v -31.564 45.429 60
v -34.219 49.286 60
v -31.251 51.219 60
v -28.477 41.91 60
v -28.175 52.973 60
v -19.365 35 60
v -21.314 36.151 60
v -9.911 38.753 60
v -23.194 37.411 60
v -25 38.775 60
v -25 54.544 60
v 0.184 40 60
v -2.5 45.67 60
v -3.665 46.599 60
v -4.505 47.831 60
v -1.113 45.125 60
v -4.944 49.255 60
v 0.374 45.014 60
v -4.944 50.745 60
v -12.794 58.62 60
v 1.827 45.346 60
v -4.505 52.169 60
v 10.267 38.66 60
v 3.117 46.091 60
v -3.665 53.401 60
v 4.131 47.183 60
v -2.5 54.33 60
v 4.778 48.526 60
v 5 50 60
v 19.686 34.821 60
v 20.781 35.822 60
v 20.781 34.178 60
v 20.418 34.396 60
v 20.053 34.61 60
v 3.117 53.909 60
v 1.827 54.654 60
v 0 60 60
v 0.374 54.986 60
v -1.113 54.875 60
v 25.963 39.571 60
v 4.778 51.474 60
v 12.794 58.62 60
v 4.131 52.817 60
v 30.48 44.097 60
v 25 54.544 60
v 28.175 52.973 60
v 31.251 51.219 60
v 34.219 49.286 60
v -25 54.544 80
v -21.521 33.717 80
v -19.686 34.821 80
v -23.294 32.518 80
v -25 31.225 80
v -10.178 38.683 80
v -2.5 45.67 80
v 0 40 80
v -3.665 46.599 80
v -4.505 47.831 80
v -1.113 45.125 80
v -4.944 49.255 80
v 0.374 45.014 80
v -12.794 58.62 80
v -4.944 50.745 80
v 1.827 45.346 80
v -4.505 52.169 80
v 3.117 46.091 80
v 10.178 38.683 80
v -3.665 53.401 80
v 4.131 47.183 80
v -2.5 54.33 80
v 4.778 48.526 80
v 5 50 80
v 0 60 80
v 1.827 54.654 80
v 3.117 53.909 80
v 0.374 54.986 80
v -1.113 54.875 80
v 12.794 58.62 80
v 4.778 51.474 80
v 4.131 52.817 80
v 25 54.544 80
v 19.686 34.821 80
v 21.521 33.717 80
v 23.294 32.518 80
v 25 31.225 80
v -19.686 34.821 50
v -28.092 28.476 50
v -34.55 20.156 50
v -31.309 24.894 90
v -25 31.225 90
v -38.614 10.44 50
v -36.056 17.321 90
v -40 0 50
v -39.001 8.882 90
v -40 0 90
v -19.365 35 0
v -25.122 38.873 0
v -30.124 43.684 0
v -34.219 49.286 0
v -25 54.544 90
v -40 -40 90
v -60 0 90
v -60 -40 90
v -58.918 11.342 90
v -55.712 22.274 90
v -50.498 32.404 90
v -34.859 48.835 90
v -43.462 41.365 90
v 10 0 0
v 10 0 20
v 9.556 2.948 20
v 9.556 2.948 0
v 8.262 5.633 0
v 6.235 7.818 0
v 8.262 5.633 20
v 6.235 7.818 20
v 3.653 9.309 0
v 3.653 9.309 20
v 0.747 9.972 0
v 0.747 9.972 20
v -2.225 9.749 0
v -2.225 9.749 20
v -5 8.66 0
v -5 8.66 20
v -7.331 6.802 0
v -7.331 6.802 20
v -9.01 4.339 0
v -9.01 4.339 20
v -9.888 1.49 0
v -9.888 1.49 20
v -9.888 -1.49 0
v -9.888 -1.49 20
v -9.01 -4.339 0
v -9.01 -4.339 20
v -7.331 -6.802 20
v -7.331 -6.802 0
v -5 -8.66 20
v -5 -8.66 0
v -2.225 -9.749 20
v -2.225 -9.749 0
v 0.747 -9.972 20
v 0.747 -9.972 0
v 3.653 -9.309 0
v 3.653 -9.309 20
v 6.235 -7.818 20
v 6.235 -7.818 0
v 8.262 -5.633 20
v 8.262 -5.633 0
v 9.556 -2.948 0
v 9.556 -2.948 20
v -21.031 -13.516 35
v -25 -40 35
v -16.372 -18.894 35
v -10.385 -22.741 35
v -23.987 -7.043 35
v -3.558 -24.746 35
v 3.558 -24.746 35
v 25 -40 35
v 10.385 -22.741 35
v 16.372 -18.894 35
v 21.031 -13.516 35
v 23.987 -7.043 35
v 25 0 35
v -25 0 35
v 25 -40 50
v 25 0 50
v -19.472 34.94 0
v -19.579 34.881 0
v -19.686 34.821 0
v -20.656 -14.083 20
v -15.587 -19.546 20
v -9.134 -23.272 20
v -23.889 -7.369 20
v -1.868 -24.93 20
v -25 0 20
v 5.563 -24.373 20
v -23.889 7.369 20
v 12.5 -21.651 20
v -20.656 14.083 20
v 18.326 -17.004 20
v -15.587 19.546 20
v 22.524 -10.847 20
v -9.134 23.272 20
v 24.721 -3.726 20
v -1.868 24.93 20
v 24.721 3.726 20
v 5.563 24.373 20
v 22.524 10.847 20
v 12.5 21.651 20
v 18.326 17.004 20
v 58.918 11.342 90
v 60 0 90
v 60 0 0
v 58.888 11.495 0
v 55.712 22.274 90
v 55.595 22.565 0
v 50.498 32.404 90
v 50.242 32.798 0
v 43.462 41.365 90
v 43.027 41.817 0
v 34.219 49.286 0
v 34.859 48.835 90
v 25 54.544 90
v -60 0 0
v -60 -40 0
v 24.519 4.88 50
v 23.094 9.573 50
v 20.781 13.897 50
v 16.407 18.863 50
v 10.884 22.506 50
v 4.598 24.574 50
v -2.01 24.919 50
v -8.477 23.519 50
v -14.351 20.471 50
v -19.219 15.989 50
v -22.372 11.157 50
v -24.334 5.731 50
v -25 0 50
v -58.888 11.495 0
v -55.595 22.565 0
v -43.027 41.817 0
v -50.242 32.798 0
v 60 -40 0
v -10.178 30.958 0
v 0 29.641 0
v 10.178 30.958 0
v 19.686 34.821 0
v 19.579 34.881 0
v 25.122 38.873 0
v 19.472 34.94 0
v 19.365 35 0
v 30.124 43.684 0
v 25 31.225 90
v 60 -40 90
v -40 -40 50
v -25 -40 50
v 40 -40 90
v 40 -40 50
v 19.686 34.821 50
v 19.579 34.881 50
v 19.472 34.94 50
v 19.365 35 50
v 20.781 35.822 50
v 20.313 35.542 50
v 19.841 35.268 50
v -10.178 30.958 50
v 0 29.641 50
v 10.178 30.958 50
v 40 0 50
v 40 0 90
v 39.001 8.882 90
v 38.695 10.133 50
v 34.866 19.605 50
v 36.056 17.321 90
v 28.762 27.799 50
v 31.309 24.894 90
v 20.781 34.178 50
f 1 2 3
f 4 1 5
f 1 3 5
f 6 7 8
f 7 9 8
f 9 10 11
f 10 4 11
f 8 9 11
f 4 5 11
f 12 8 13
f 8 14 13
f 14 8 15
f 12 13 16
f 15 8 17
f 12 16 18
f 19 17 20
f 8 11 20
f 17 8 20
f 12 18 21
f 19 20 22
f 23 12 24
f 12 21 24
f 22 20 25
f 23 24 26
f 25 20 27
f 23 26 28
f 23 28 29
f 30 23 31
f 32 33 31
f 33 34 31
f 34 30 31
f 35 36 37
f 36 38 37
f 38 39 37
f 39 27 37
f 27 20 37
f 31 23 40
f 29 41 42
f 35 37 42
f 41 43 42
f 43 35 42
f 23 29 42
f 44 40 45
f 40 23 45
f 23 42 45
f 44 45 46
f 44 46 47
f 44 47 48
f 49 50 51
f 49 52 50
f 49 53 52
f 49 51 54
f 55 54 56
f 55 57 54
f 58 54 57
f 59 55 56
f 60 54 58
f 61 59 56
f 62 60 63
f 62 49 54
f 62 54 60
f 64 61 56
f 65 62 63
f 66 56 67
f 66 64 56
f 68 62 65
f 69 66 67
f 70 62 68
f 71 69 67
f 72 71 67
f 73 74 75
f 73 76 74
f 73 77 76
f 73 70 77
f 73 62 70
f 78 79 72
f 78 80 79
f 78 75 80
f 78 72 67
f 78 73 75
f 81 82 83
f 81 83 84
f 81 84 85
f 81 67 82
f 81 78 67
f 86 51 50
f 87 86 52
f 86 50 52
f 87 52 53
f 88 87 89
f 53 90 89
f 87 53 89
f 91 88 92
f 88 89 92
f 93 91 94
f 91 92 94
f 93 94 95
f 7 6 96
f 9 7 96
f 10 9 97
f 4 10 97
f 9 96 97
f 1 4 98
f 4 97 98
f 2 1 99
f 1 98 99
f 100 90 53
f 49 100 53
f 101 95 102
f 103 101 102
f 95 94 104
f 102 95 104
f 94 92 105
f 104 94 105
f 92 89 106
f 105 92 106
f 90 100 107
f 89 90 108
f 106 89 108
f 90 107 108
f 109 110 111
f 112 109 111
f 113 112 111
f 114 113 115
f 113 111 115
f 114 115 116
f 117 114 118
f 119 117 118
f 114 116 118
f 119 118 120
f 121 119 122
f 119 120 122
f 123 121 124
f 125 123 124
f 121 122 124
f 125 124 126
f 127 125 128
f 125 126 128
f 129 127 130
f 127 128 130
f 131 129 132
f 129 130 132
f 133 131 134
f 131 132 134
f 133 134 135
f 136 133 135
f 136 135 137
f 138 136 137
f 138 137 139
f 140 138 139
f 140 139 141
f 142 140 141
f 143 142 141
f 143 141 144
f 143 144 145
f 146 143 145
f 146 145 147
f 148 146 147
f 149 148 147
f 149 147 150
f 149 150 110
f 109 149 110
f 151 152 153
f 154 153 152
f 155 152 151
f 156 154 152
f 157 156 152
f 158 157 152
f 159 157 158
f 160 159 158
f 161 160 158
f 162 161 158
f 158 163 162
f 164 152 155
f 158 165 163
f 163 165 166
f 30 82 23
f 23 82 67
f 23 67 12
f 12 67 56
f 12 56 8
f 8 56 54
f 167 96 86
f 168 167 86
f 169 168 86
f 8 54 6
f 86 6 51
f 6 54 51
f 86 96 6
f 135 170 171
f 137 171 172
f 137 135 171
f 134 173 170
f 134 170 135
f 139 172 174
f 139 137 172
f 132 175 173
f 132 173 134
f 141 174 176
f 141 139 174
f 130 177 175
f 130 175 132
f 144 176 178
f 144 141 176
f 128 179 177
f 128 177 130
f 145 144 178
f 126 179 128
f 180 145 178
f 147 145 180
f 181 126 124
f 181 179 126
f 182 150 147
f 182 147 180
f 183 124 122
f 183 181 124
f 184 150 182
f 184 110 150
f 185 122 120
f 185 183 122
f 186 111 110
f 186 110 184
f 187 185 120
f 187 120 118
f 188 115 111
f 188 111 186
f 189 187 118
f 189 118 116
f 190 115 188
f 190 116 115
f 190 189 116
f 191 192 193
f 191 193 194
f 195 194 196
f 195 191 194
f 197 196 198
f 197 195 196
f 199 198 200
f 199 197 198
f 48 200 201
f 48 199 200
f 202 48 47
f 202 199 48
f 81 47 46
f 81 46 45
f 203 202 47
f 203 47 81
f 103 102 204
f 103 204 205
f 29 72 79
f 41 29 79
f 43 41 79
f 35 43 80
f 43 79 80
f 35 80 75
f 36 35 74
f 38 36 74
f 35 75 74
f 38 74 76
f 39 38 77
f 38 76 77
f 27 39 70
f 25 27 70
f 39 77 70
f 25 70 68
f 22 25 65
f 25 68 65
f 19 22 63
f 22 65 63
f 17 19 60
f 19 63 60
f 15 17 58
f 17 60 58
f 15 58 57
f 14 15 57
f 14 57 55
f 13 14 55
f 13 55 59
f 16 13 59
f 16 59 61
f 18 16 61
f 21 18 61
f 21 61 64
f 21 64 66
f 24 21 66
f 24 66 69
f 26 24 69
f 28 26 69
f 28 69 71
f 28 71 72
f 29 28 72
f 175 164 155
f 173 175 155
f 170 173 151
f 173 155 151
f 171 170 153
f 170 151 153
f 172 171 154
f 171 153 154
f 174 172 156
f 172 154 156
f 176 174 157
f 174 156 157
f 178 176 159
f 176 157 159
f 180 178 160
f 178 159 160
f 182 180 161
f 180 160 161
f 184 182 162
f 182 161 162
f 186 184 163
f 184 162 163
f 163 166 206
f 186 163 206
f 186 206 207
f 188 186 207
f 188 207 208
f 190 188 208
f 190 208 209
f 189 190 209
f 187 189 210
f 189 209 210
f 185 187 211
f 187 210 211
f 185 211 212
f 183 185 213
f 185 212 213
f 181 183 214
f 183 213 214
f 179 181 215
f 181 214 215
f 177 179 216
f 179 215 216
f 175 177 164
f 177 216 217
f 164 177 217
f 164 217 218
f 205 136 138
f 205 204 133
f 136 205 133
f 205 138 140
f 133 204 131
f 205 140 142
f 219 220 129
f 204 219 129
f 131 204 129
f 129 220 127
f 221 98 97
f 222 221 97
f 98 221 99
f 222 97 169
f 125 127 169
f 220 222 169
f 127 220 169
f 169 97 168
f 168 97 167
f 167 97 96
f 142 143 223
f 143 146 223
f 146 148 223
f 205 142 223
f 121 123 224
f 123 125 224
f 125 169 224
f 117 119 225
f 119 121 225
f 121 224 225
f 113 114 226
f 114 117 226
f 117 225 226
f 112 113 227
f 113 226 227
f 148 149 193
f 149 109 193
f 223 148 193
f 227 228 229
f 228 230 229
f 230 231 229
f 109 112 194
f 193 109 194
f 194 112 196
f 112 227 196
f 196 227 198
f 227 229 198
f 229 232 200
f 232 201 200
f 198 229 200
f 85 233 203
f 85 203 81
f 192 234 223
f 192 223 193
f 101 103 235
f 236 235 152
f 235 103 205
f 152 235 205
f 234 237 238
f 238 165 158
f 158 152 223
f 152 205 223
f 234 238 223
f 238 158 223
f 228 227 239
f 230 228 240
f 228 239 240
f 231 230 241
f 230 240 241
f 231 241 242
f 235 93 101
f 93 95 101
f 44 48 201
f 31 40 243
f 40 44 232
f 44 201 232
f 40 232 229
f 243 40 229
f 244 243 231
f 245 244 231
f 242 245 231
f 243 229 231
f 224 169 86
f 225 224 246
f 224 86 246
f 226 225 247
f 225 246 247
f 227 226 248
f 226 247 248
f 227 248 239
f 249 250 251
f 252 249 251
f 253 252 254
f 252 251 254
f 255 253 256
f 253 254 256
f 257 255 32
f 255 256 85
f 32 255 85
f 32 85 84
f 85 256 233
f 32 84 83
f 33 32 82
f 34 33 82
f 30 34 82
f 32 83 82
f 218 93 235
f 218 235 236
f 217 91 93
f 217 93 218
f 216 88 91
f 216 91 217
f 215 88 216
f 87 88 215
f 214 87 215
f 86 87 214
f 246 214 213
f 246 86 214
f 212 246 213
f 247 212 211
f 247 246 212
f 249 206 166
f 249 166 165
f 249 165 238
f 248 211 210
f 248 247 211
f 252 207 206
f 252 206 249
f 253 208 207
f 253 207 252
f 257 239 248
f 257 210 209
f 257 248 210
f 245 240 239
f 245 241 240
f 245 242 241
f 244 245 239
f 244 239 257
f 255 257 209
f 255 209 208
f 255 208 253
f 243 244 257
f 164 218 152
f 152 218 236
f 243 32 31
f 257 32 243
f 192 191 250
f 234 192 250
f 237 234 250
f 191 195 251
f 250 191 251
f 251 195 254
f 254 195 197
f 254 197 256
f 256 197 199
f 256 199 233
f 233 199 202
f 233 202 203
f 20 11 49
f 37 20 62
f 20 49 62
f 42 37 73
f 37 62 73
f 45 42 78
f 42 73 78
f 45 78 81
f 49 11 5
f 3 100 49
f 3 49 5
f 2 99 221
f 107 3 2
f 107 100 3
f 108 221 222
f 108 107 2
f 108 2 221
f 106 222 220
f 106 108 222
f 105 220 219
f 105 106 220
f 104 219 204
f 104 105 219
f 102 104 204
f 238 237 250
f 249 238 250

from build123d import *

# Parameters (mm, degrees)
BOSS_EXTRUDE1_DEPTH      = 90
SKETCH3_R                = 10
CUT_EXTRUDE2_DEPTH       = 90
SKETCH6_R                = 10
BOSS_EXTRUDE2_DEPTH      = 90
SKETCH7_R                = 5
CUT_EXTRUDE3_DEPTH       = 90
CUT_EXTRUDE4_DEPTH       = 60
CUT_EXTRUDE5_DEPTH       = 60
BOSS_EXTRUDE3_DEPTH      = 10
BOSS_EXTRUDE4_DEPTH      = 55
CUT_EXTRUDE6_DEPTH       = 40
CUT_EXTRUDE7_DEPTH       = 106
SKETCH16_R               = 5
CUT_EXTRUDE8_DEPTH       = 106
CUT_EXTRUDE9_DEPTH       = 70
SKETCH18_R               = 5
BOSS_EXTRUDE6_DEPTH      = 15
CUT_EXTRUDE18_DEPTH      = 40
SKETCH22_W               = 40
SKETCH22_H               = 41.844000914
CUT_EXTRUDE19_DEPTH      = 20
SKETCH23_W               = 40
SKETCH23_H               = 40.367693543
CUT_EXTRUDE20_DEPTH      = 20
SKETCH25_R               = 25
BOSS_EXTRUDE7_DEPTH      = 40
SKETCH26_R               = 25
CUT_EXTRUDE21_DEPTH      = 10
CUT_EXTRUDE22_DEPTH      = 34
SKETCH28_R               = 25
CUT_EXTRUDE24_DEPTH      = 60
BOSS_EXTRUDE10_DEPTH     = 15
BOSS_EXTRUDE11_DEPTH     = 30
CUT_EXTRUDE28_DEPTH      = 209.999
BOSS_EXTRUDE12_DEPTH     = 30
SKETCH36_W               = 50
SKETCH36_H               = 10
CUT_EXTRUDE29_DEPTH      = 87
SKETCH38_R               = 5
CUT_EXTRUDE30_DEPTH      = 87
SKETCH39_R               = 10
BOSS_EXTRUDE14_DEPTH     = 60
SKETCH40_R               = 10
CUT_EXTRUDE31_DEPTH      = 40
CUT_EXTRUDE32_DEPTH      = 20
SKETCH47_W               = 40
SKETCH47_H               = 10
CUT_EXTRUDE34_DEPTH      = 65
BOSS_EXTRUDE23_DEPTH     = 20
SKETCH49_R               = 10
CUT_EXTRUDE35_DEPTH      = 20
SKETCH50_R               = 25
CUT_EXTRUDE36_DEPTH      = 60
CUT_EXTRUDE39_DEPTH      = 40
CUT_EXTRUDE41_DEPTH      = 4574
BOSS_EXTRUDE24_DEPTH     = 20
CUT_EXTRUDE43_DEPTH      = 11
CUT_EXTRUDE43_DEPTH_BACK = 81
CUT_EXTRUDE47_DEPTH      = 30
CUT_EXTRUDE48_DEPTH      = 5


with BuildPart() as part:
    # Sketch1 → Boss-Extrude1 (new body)
    with BuildSketch(Plane.XY):
        with BuildLine():
            Line((-40, 0), (-40, -40))
            Line((-40, -40), (40, -40))
            Line((40, -40), (40, 0))
            ThreePointArc((40, 0), (0, 40), (-40, 0))
        make_face()
    extrude(amount=BOSS_EXTRUDE1_DEPTH)

    # Sketch3 → Cut-Extrude2 (cut)
    with BuildSketch(Plane.XY.offset(90)):
        Circle(SKETCH3_R)
    extrude(amount=-CUT_EXTRUDE2_DEPTH, mode=Mode.SUBTRACT)

    # Sketch6 → Boss-Extrude2 (add)
    with BuildSketch(Plane.XY.offset(90)):
        with BuildLine():
            Line((-60, 0), (-60, -40))
            Line((-60, -40), (60, -40))
            Line((60, -40), (60, 0))
            ThreePointArc((60, 0), (0, 60), (-60, 0))
        make_face()
        Circle(SKETCH6_R, mode=Mode.SUBTRACT)
    extrude(amount=-BOSS_EXTRUDE2_DEPTH)

    # Sketch7 → Cut-Extrude3 (cut)
    with BuildSketch(Plane.XY.offset(90)):
        with Locations((0, 50)):
            Circle(SKETCH7_R)
    extrude(amount=-CUT_EXTRUDE3_DEPTH, mode=Mode.SUBTRACT)

    # Sketch8 → Cut-Extrude4 (cut)
    with BuildSketch(Plane(origin=(0, 0, 0), x_dir=(-1, 0, 0), z_dir=(0, 0, -1))):
        with BuildLine():
            ThreePointArc((34.218684477, 49.285714286), (0, 30), (-34.218684477, 49.285714286))
            ThreePointArc((-34.218684477, 49.285714286), (0, 60), (34.218684477, 49.285714286))
        make_face()
    extrude(amount=-CUT_EXTRUDE4_DEPTH, mode=Mode.SUBTRACT)

    # Sketch10 → Cut-Extrude5 (cut)
    with BuildSketch(Plane.XY.offset(50)):
        with BuildLine():
            Line((-25, 54.543560573), (-25, 32))
            ThreePointArc((-25, 32), (0, 40.607881008), (25, 32))
            Line((25, 32), (25, 54.543560573))
            ThreePointArc((25, 54.543560573), (0, 60), (-25, 54.543560573))
        make_face()
    extrude(amount=CUT_EXTRUDE5_DEPTH, mode=Mode.SUBTRACT)

    # Sketch12 → Boss-Extrude3 (add)
    with BuildSketch(Plane.XY.offset(50)):
        with BuildLine():
            ThreePointArc((25, 38.775010008), (22.557314587, 36.967174529), (19.98443144, 35.35))
            Line((19.98443144, 35.35), (25, 32))
            Line((25, 32), (25, 38.775010008))
        make_face()
        with BuildLine():
            ThreePointArc((-19.98443144, 35.35), (-22.557314587, 36.967174529), (-25, 38.775010008))
            Line((-25, 38.775010008), (-25, 32))
            Line((-25, 32), (-19.98443144, 35.35))
        make_face()
    extrude(amount=BOSS_EXTRUDE3_DEPTH)

    # Sketch13 → Boss-Extrude4 (add)
    with BuildSketch(Plane.XY.offset(90)):
        with BuildLine():
            ThreePointArc((-25, 54.543560573), (0, 60), (25, 54.543560573))
            Line((25, 54.543560573), (25, 32))
            ThreePointArc((25, 32), (0, 40.607881008), (-25, 32))
            Line((-25, 32), (-25, 54.543560573))
        make_face()
    extrude(amount=-BOSS_EXTRUDE4_DEPTH)

    # Sketch14 → Cut-Extrude6 (cut)
    with BuildSketch(Plane.XY.offset(90)):
        with BuildLine():
            Line((-25, 54.543560573), (-25, 32))
            ThreePointArc((-25, 32), (0, 40.607881008), (25, 32))
            Line((25, 32), (25, 54.543560573))
            ThreePointArc((25, 54.543560573), (0, 60), (-25, 54.543560573))
        make_face()
    extrude(amount=-CUT_EXTRUDE6_DEPTH, mode=Mode.SUBTRACT)

    # Sketch15 → Cut-Extrude7 (cut)
    with BuildSketch(Plane(origin=(0, 0, 35), x_dir=(-1, 0, 0), z_dir=(0, 0, -1))):
        with BuildLine():
            ThreePointArc((-19.98443144, 35.35), (0, 40.607881008), (19.98443144, 35.35))
            ThreePointArc((19.98443144, 35.35), (0, 30), (-19.98443144, 35.35))
        make_face()
    extrude(amount=-CUT_EXTRUDE7_DEPTH, mode=Mode.SUBTRACT)

    # Sketch16 → Cut-Extrude8 (cut)
    with BuildSketch(Plane.XY.offset(50)):
        with Locations((0, 50)):
            Circle(SKETCH16_R)
    extrude(amount=-CUT_EXTRUDE8_DEPTH, mode=Mode.SUBTRACT)

    # Sketch17 → Cut-Extrude9 (cut)
    with BuildSketch(Plane.XY.offset(90)):
        with BuildLine():
            Line((-25, 0), (-25, -40))
            Line((-25, -40), (25, -40))
            Line((25, -40), (25, 0))
            ThreePointArc((25, 0), (0, 25), (-25, 0))
        make_face()
    extrude(amount=-CUT_EXTRUDE9_DEPTH, mode=Mode.SUBTRACT)

    # Sketch18 → Boss-Extrude6 (add)
    with BuildSketch(Plane.XY.offset(50)):
        with Locations((0, 50)):
            Circle(SKETCH18_R)
    extrude(amount=-BOSS_EXTRUDE6_DEPTH)

    # Sketch19 → Cut-Extrude18 (cut)
    with BuildSketch(Plane.XY.offset(50)):
        with BuildLine():
            Line((-40, 0), (-40, -40))
            Line((-40, -40), (40, -40))
            Line((40, -40), (40, 0))
            ThreePointArc((40, 0), (0, 40), (-40, 0))
        make_face()
    extrude(amount=CUT_EXTRUDE18_DEPTH, mode=Mode.SUBTRACT)

    # Sketch22 → Cut-Extrude19 (cut)
    with BuildSketch(Plane(origin=(-25, 0, 0), x_dir=(0, 0, -1), z_dir=(1, 0, 0))):
        with Locations((-70, 33.621560116)):
            Rectangle(SKETCH22_W, SKETCH22_H)
    extrude(amount=CUT_EXTRUDE19_DEPTH, mode=Mode.SUBTRACT)

    # Sketch23 → Cut-Extrude20 (cut)
    with BuildSketch(Plane.ZY.offset(-25)):
        with Locations((70, 34.359713801)):
            Rectangle(SKETCH23_W, SKETCH23_H)
    extrude(amount=CUT_EXTRUDE20_DEPTH, mode=Mode.SUBTRACT)

    # Sketch27 → Cut-Extrude22 (cut)
    with BuildSketch(Plane(origin=(0, 0, 35), x_dir=(-1, 0, 0), z_dir=(0, 0, -1))):
        with BuildLine():
            Line((-25, 54.543560573), (-25, 38.775010008))
            ThreePointArc((-25, 38.775010008), (-22.557314587, 36.967174529), (-19.98443144, 35.35))
            ThreePointArc((-19.98443144, 35.35), (0, 40.607881008), (19.98443144, 35.35))
            ThreePointArc((19.98443144, 35.35), (22.557314587, 36.967174529), (25, 38.775010008))
            Line((25, 38.775010008), (25, 54.543560573))
            ThreePointArc((25, 54.543560573), (0, 60), (-25, 54.543560573))
        make_face()
    extrude(amount=-CUT_EXTRUDE22_DEPTH, mode=Mode.SUBTRACT)

    # Sketch32 → Boss-Extrude10 (add)
    with BuildSketch(Plane.XY.offset(20)):
        with BuildLine():
            ThreePointArc((25, 0), (0, -25), (-25, 0))
            Line((-25, 0), (-25, -40))
            Line((-25, -40), (25, -40))
            Line((25, -40), (25, 0))
        make_face()
    extrude(amount=BOSS_EXTRUDE10_DEPTH)

    # Sketch33 → Boss-Extrude11 (add)
    with BuildSketch(Plane.XY.offset(90)):
        with BuildLine():
            Line((-25, 31.224989992), (-25, 54.543560573))
            ThreePointArc((-25, 54.543560573), (0, 60), (25, 54.543560573))
            Line((25, 54.543560573), (25, 31.224989992))
            ThreePointArc((25, 31.224989992), (0, 40), (-25, 31.224989992))
        make_face()
    extrude(amount=-BOSS_EXTRUDE11_DEPTH)

    # Sketch34 → Cut-Extrude28 (cut)
    with BuildSketch(Plane.XY.offset(50)):
        with BuildLine():
            Line((-25, 38.775010008), (-25, 31.224989992))
            ThreePointArc((-25, 31.224989992), (-22.262617418, 33.232151085), (-19.364916731, 35))
            ThreePointArc((-19.364916731, 35), (-22.262617418, 36.767848915), (-25, 38.775010008))
        make_face()
    extrude(amount=CUT_EXTRUDE28_DEPTH, mode=Mode.SUBTRACT)

    # Sketch35 → Boss-Extrude12 (add)
    with BuildSketch(Plane.XY.offset(90)):
        with BuildLine():
            Line((-25, 31.224989992), (-25, 38.775010008))
            ThreePointArc((-25, 38.775010008), (-22.262617418, 36.767848915), (-19.364916731, 35))
            ThreePointArc((-19.364916731, 35), (-22.262617418, 33.232151085), (-25, 31.224989992))
        make_face()
    extrude(amount=-BOSS_EXTRUDE12_DEPTH)

    # Sketch36 → Cut-Extrude29 (cut)
    with BuildSketch(Plane(origin=(0, 0, 0), x_dir=(1, 0, 0), z_dir=(0, 1, 0))):
        with Locations((0, -85)):
            Rectangle(SKETCH36_W, SKETCH36_H)
    extrude(amount=CUT_EXTRUDE29_DEPTH, mode=Mode.SUBTRACT)

    # Sketch38 → Cut-Extrude30 (cut)
    with BuildSketch(Plane.XY.offset(80)):
        with Locations((0, 50)):
            Circle(SKETCH38_R)
    extrude(amount=-CUT_EXTRUDE30_DEPTH, mode=Mode.SUBTRACT)

    # Sketch39 → Boss-Extrude14 (add)
    with BuildSketch(Plane(origin=(0, 0, 0), x_dir=(-1, 0, 0), z_dir=(0, 0, -1))):
        with BuildLine():
            Line((-60, 0), (-60, -40))
            Line((-60, -40), (60, -40))
            Line((60, -40), (60, 0))
            ThreePointArc((60, 0), (53.165407309, 27.810779667), (34.218684477, 49.285714286))
            ThreePointArc((34.218684477, 49.285714286), (0, 30), (-34.218684477, 49.285714286))
            ThreePointArc((-34.218684477, 49.285714286), (-53.165407309, 27.810779667), (-60, 0))
        make_face()
        Circle(SKETCH39_R, mode=Mode.SUBTRACT)
    extrude(amount=-BOSS_EXTRUDE14_DEPTH)

    # Sketch40 → Cut-Extrude31 (cut)
    with BuildSketch(Plane.XY.offset(60)):
        with BuildLine():
            ThreePointArc((25, 0), (0, 25), (-25, 0))
            ThreePointArc((-25, 0), (0, -25), (25, 0))
        make_face()
        Circle(SKETCH40_R, mode=Mode.SUBTRACT)
    extrude(amount=-CUT_EXTRUDE31_DEPTH, mode=Mode.SUBTRACT)

    # Sketch41 → Cut-Extrude32 (cut)
    with BuildSketch(Plane.XY.offset(60)):
        with BuildLine():
            Line((-25, 0), (-25, -40))
            Line((-25, -40), (25, -40))
            Line((25, -40), (25, 0))
            ThreePointArc((25, 0), (0, -25), (-25, 0))
        make_face()
    extrude(amount=-CUT_EXTRUDE32_DEPTH, mode=Mode.SUBTRACT)

    # Sketch47 → Cut-Extrude34 (cut)
    with BuildSketch(Plane(origin=(0, 0, 0), x_dir=(1, 0, 0), z_dir=(0, 1, 0))):
        with Locations((0.781315523, -55)):
            Rectangle(SKETCH47_W, SKETCH47_H)
    extrude(amount=CUT_EXTRUDE34_DEPTH, mode=Mode.SUBTRACT)

    # Sketch48 → Boss-Extrude23 (add)
    with BuildSketch(Plane.XY.offset(60)):
        with BuildLine():
            Line((-40, 0), (-40, -40))
            Line((-40, -40), (40, -40))
            Line((40, -40), (40, 0))
            ThreePointArc((40, 0), (0, 40), (-40, 0))
        make_face()
    extrude(amount=BOSS_EXTRUDE23_DEPTH)

    # Sketch49 → Cut-Extrude35 (cut)
    with BuildSketch(Plane(origin=(0, 0, 60), x_dir=(-1, 0, 0), z_dir=(0, 0, -1))):
        Circle(SKETCH49_R)
    extrude(amount=-CUT_EXTRUDE35_DEPTH, mode=Mode.SUBTRACT)

    # Sketch50 → Cut-Extrude36 (cut)
    with BuildSketch(Plane.XY.offset(80)):
        Circle(SKETCH50_R)
    extrude(amount=-CUT_EXTRUDE36_DEPTH, mode=Mode.SUBTRACT)

    # Sketch51 → Cut-Extrude39 (cut)
    with BuildSketch(Plane.XY.offset(80)):
        with BuildLine():
            Line((-25, 0), (-25, -40))
            Line((-25, -40), (25, -40))
            Line((25, -40), (25, 0))
            ThreePointArc((25, 0), (0, -25), (-25, 0))
        make_face()
    extrude(amount=-CUT_EXTRUDE39_DEPTH, mode=Mode.SUBTRACT)

    # Sketch53 → Cut-Extrude41 (cut)
    with BuildSketch(Plane.XY.offset(50)):
        with BuildLine():
            Line((-19.218684477, 34.919490212), (-19.218684477, 15.988813807))
            ThreePointArc((-19.218684477, 15.988813807), (1.305368543, 24.965896999), (20.781315523, 13.897371159))
            Line((20.781315523, 13.897371159), (20.781315523, 35.821981843))
            ThreePointArc((20.781315523, 35.821981843), (0.902262009, 30.010177254), (-19.218684477, 34.919490212))
        make_face()
    extrude(amount=CUT_EXTRUDE41_DEPTH, mode=Mode.SUBTRACT)

    # Sketch54 → Boss-Extrude24 (add)
    with BuildSketch(Plane.XY.offset(80)):
        with BuildLine():
            Line((-19.218684477, 34.919490212), (-19.218684477, 15.988813807))
            ThreePointArc((-19.218684477, 15.988813807), (1.305368543, 24.965896999), (20.781315523, 13.897371159))
            Line((20.781315523, 13.897371159), (20.781315523, 35.821981843))
            ThreePointArc((20.781315523, 35.821981843), (0.902262009, 30.010177254), (-19.218684477, 34.919490212))
        make_face()
        with BuildLine():
            Line((-25, 31.224989992), (-25, 0))
            ThreePointArc((-25, 0), (-23.510286174, 8.500967241), (-19.218684477, 15.988813807))
            Line((-19.218684477, 15.988813807), (-19.218684477, 34.919490212))
            ThreePointArc((-19.218684477, 34.919490212), (0.902262009, 30.010177254), (20.781315523, 35.821981843))
            Line((20.781315523, 35.821981843), (20.781315523, 13.897371159))
            ThreePointArc((20.781315523, 13.897371159), (23.86879169, 7.43510479), (24.997369654, 0.362643585))
            Line((24.997369654, 0.362643585), (25, 39.634007744))
            Line((25, 39.634007744), (-25, 39.634007744))
            Line((-25, 39.634007744), (-25, 31.224989992))
        make_face()
    extrude(amount=-BOSS_EXTRUDE24_DEPTH)

    # Sketch55 → Cut-Extrude43 (cut, two sides)
    with BuildSketch(Plane.XY.offset(80)) as cut_extrude43_sk:
        with BuildLine():
            ThreePointArc((19.68583799, 34.820508076), (0, 40), (-19.68583799, 34.820508076))
            ThreePointArc((-19.68583799, 34.820508076), (0, 29.641016151), (19.68583799, 34.820508076))
        make_face()
    extrude(amount=CUT_EXTRUDE43_DEPTH, mode=Mode.SUBTRACT)
    extrude(cut_extrude43_sk.sketch, amount=-CUT_EXTRUDE43_DEPTH_BACK, mode=Mode.SUBTRACT)

    # Sketch57 → Cut-Extrude47 (cut)
    with BuildSketch(Plane.XY.offset(80)):
        with BuildLine():
            Line((-40, 0), (-40, -40))
            Line((-40, -40), (-25, -40))
            Line((-25, -40), (-25, 0))
            ThreePointArc((-25, 0), (0, 25), (25, 0))
            Line((25, 0), (25, -40))
            Line((25, -40), (40, -40))
            Line((40, -40), (40, 0))
            ThreePointArc((40, 0), (0, 40), (-40, 0))
        make_face()
    extrude(amount=-CUT_EXTRUDE47_DEPTH, mode=Mode.SUBTRACT)

    # Sketch60 → Cut-Extrude48 (cut)
    with BuildSketch(Plane.XY.offset(40)):
        with BuildLine():
            Line((25, -40), (25, 0))
            ThreePointArc((25, 0), (0, -25), (-25, 0))
            Line((-25, 0), (-25, -40))
            Line((-25, -40), (25, -40))
        make_face()
    extrude(amount=-CUT_EXTRUDE48_DEPTH, mode=Mode.SUBTRACT)


with BuildPart() as body_2:
    # Sketch25 → Boss-Extrude7 (new body)
    with BuildSketch(Plane.XY.offset(90)):
        Circle(SKETCH25_R)
    extrude(amount=-BOSS_EXTRUDE7_DEPTH)

    # Sketch26 → Cut-Extrude21 (cut)
    with BuildSketch(Plane.XY.offset(90)):
        Circle(SKETCH26_R)
    extrude(amount=-CUT_EXTRUDE21_DEPTH, mode=Mode.SUBTRACT)

    # Sketch28 → Cut-Extrude24 (cut)
    with BuildSketch(Plane.XY.offset(80)):
        Circle(SKETCH28_R)
    extrude(amount=-CUT_EXTRUDE24_DEPTH, mode=Mode.SUBTRACT)


solid = part.part
